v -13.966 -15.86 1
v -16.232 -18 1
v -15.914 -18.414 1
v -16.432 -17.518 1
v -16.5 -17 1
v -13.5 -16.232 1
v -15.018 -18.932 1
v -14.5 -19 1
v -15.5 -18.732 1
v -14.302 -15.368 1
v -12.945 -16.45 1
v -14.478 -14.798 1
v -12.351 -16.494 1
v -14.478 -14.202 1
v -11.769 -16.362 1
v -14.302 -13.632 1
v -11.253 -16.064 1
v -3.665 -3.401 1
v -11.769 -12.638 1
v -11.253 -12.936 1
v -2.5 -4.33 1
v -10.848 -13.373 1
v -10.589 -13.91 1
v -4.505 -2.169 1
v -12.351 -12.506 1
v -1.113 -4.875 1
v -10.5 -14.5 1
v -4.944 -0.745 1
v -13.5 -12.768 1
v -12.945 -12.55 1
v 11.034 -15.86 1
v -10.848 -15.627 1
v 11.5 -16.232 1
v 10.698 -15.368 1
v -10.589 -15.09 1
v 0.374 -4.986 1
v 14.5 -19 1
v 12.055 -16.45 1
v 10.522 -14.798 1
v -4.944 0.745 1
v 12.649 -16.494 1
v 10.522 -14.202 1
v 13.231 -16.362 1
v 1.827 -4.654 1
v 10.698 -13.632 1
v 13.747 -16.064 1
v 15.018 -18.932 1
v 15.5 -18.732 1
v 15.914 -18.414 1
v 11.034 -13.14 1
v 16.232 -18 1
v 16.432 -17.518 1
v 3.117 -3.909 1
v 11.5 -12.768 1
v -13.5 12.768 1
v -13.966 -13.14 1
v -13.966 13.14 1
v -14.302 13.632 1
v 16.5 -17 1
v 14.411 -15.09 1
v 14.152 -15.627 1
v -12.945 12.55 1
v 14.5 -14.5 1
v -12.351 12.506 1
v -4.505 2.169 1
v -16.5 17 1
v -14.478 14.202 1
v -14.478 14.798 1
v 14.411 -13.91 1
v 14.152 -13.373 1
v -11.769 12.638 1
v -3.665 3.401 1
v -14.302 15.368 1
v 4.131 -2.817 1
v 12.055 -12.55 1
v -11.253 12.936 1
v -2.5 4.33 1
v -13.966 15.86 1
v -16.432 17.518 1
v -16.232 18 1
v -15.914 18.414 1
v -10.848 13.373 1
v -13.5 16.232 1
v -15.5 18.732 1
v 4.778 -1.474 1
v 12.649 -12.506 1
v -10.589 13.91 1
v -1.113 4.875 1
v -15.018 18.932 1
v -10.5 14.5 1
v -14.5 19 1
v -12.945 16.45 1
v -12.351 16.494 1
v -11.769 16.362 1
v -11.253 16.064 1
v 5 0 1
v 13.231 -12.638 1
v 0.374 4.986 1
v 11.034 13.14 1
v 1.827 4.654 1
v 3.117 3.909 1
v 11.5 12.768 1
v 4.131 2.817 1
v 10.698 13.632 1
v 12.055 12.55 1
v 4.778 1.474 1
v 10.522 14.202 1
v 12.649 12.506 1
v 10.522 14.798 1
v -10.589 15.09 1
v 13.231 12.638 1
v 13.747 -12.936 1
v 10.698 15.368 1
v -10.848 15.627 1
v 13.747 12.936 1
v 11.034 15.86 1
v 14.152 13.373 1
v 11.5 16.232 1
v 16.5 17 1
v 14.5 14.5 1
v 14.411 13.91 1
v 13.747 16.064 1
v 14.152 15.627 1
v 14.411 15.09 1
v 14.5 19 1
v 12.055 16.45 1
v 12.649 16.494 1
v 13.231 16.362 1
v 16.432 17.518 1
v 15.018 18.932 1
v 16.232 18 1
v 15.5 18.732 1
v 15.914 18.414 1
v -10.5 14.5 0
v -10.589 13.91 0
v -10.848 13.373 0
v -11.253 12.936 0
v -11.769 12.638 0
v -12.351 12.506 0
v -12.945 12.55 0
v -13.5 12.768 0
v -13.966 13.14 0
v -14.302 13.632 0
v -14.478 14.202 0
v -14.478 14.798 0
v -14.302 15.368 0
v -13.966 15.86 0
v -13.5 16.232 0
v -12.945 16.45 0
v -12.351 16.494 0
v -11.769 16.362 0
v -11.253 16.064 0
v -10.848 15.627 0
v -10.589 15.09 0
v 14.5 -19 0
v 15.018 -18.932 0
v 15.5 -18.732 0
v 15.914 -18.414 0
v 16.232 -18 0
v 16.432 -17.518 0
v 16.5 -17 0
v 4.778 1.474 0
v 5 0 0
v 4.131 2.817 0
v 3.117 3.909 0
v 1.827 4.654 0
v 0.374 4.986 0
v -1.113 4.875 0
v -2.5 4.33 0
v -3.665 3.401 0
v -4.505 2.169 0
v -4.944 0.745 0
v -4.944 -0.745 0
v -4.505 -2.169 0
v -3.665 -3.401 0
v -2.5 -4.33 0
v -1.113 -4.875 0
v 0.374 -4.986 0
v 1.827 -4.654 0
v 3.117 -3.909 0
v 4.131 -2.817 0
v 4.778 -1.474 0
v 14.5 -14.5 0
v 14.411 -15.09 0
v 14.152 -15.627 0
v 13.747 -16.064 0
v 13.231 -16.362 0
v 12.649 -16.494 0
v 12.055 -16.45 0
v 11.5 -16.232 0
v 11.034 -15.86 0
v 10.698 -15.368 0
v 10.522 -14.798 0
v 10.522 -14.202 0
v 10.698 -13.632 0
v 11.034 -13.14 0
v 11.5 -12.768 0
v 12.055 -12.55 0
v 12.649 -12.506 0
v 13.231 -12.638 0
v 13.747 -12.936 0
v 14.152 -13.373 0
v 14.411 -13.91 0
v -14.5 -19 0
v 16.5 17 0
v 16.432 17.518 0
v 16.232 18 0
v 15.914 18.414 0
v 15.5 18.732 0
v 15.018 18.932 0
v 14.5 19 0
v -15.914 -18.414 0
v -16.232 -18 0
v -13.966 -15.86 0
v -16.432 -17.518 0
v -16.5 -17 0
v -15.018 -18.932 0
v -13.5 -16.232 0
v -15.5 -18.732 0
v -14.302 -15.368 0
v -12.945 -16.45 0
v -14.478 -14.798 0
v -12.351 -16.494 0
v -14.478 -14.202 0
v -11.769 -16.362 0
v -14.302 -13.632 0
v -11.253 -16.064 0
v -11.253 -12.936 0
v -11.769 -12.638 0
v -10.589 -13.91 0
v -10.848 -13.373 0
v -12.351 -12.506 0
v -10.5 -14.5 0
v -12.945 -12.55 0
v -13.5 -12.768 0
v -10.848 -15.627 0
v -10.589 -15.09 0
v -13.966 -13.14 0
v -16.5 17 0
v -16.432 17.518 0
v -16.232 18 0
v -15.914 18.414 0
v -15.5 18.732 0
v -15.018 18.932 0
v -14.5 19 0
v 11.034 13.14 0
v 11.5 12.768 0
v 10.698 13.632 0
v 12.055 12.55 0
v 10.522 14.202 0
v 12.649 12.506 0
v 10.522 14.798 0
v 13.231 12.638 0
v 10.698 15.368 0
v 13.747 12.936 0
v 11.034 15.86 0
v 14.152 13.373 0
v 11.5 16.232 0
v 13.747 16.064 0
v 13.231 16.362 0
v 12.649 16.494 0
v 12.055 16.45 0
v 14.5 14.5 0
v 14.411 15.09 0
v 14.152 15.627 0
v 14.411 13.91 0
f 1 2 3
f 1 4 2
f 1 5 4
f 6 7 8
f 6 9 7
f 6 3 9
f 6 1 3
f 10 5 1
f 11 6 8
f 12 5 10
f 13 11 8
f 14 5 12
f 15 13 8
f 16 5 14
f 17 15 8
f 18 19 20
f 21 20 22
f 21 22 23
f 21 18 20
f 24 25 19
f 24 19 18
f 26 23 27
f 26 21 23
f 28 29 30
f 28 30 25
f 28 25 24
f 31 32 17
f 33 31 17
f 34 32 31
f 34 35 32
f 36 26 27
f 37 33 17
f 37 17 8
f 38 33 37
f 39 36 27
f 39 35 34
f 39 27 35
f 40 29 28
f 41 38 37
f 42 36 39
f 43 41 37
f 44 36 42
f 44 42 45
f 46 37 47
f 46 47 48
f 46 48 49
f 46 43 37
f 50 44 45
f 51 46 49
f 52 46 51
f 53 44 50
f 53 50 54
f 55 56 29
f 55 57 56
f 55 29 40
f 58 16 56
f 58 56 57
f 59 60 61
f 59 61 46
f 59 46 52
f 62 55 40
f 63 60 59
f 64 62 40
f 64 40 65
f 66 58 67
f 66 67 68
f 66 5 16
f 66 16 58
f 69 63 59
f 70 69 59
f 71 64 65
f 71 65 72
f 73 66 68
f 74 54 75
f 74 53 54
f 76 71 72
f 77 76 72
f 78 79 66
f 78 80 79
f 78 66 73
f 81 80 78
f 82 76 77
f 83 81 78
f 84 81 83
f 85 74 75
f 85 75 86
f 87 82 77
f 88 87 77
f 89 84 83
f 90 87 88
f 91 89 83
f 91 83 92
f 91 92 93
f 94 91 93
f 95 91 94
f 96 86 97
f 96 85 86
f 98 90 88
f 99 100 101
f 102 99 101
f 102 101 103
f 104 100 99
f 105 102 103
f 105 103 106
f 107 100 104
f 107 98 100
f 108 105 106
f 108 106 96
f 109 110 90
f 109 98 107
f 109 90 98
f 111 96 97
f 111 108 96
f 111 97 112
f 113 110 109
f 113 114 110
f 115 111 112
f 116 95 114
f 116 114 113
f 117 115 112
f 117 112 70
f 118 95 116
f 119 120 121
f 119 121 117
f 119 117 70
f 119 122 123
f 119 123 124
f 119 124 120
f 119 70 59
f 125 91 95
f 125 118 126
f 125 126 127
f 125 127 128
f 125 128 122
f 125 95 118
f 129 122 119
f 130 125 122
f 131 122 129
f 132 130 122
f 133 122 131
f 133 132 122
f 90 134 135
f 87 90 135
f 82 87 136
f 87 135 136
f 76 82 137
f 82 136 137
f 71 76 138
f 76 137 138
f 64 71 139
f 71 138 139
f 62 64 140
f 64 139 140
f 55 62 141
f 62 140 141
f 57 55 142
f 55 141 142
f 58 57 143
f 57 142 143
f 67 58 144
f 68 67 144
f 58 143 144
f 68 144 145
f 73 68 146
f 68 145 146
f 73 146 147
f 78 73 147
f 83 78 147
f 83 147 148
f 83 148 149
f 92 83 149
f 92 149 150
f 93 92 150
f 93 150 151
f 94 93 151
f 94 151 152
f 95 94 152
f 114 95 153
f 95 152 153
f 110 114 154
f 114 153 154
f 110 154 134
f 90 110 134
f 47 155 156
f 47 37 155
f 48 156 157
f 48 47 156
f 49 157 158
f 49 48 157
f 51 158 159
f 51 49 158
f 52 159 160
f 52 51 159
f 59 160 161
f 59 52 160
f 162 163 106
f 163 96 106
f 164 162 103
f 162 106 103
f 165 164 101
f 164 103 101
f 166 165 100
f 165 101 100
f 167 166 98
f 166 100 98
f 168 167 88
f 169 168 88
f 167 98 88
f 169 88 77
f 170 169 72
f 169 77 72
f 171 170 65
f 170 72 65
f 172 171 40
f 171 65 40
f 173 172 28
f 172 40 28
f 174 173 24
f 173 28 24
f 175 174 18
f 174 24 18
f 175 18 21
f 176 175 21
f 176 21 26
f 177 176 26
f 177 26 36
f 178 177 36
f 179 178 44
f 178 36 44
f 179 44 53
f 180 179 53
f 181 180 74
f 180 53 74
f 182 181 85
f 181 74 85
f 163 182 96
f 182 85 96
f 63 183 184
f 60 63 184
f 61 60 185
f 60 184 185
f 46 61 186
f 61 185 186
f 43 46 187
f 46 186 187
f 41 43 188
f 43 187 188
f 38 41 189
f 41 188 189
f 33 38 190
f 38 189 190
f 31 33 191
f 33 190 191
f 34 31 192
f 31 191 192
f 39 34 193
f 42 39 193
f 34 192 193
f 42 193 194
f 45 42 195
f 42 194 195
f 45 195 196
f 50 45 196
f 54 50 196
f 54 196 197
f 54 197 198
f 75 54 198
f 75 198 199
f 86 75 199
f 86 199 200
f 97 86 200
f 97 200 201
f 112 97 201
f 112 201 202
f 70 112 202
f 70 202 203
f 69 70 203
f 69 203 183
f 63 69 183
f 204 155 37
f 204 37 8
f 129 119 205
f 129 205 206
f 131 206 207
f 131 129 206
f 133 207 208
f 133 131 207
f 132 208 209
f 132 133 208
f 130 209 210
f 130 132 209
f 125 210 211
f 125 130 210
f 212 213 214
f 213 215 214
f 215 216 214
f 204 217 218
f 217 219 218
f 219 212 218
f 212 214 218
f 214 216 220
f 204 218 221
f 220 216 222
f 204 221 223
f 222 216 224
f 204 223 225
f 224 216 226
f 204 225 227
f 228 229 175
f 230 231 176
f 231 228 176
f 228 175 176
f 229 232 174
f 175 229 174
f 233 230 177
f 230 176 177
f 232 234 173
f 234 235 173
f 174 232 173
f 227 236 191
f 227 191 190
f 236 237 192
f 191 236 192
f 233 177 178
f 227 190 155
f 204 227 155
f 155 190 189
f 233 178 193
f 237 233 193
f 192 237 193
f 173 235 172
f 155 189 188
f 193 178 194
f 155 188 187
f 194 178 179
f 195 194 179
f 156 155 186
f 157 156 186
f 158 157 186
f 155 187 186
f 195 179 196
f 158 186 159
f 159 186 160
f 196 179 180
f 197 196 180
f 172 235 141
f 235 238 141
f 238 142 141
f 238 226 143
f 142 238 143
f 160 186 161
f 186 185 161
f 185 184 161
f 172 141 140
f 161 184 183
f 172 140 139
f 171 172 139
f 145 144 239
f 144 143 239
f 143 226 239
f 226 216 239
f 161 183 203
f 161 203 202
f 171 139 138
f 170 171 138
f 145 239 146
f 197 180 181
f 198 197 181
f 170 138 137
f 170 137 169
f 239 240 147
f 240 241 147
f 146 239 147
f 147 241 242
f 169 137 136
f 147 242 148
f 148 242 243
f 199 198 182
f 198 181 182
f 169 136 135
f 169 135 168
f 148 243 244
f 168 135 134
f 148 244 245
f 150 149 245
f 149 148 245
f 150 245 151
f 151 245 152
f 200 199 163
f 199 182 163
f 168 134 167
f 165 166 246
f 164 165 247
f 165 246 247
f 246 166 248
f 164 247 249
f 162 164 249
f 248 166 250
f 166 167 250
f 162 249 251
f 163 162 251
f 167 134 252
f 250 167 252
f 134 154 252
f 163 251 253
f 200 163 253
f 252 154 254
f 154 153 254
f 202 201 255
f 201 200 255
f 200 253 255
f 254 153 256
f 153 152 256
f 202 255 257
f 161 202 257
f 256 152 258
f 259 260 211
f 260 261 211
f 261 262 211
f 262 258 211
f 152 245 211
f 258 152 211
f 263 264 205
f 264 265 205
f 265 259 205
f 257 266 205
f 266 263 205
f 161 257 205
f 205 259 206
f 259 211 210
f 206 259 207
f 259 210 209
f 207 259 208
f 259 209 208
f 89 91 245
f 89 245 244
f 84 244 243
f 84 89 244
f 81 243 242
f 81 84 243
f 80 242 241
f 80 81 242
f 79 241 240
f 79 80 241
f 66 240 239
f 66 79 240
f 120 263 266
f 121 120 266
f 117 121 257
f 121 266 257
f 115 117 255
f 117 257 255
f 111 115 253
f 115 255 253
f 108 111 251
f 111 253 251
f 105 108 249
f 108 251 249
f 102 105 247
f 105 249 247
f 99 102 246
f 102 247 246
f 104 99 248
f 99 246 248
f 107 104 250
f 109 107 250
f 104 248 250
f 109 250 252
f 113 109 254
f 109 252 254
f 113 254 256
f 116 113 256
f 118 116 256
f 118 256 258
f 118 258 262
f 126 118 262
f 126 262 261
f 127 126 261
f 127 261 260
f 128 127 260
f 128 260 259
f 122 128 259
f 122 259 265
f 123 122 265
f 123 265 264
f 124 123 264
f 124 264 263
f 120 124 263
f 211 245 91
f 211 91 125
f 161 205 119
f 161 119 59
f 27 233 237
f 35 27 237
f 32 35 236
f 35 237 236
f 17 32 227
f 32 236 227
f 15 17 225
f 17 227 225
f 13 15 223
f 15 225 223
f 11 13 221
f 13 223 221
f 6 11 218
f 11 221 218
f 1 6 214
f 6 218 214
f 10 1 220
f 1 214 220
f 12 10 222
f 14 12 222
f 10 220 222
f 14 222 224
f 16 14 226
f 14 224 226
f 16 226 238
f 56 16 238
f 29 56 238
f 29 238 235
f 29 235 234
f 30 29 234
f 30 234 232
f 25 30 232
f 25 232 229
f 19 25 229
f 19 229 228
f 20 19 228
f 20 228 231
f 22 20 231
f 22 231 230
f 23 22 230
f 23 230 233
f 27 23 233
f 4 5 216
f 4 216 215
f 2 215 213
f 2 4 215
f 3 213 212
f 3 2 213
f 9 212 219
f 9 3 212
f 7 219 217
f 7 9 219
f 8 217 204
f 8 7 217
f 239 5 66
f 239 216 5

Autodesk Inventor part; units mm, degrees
ref_plane "YZ Plane" through (0, 0, 0) normal (1, 0, 0) x (0, 1, 0)
ref_plane "XZ Plane" through (0, 0, 0) normal (0, 1, 0) x (-1, 0, 0)
ref_plane "XY Plane" through (0, 0, 0) normal (0, 0, 1) x (1, 0, 0)
sketch "스케치1" plane through (0, 0, 0) normal (0, 0, 1) x (1, 0, 0)
  line L0 (16.5, -19) -> (-16.5, -19)
  line L1 (-16.5, -19) -> (-16.5, 19)
  line L2 (-16.5, 19) -> (16.5, 19)
  line L3 (16.5, 19) -> (16.5, -19)
  line L4 (16.5, -19) -> (-16.5, 19) construction
  line L5 (-16.5, -19) -> (16.5, 19) construction
  line L6 (12.5, -14.5) -> (-12.5, -14.5)
  line L7 (-12.5, -14.5) -> (-12.5, 14.5)
  line L8 (-12.5, 14.5) -> (12.5, 14.5)
  line L9 (12.5, 14.5) -> (12.5, -14.5)
  line L10 (12.5, -14.5) -> (-12.5, 14.5) construction
  line L11 (-12.5, -14.5) -> (12.5, 14.5) construction
  circle A0 centre (-12.5, 14.5) radius 2
  circle A1 centre (12.5, 14.5) radius 2
  circle A2 centre (12.5, -14.5) radius 2
  circle A3 centre (-12.5, -14.5) radius 2
  point P0 (0, 0)
  dimension "d14" = 33
  dimension "d15" = 38
  dimension "d16" = 25
  dimension "d17" = 29
  dimension "d18" = 4
  dimension "d19" = 4
  dimension "d20" = 4
  dimension "d21" = 4
extrude "돌출1" add sketch "스케치1" along normal blind 1 contours L0 L1 L2 L3 | A3 L7 A0 L8 A1 L9 A2 L6
fillet "모깎기1" radius 2 4 edges at (-16.5, 19, 0.5) (16.5, 19, 0.5) (16.5, -19, 0.5) (-16.5, -19, 0.5)
sketch "스케치2" plane through (0, 0, 1) normal (0, 0, 1) x (1, 0, 0)
  circle A0 centre (0, 0) radius 5
  dimension "d11" = 10
extrude "돌출2" cut sketch "스케치2" against normal through all
properties part number "castor_top" material "알루미늄 6061"
